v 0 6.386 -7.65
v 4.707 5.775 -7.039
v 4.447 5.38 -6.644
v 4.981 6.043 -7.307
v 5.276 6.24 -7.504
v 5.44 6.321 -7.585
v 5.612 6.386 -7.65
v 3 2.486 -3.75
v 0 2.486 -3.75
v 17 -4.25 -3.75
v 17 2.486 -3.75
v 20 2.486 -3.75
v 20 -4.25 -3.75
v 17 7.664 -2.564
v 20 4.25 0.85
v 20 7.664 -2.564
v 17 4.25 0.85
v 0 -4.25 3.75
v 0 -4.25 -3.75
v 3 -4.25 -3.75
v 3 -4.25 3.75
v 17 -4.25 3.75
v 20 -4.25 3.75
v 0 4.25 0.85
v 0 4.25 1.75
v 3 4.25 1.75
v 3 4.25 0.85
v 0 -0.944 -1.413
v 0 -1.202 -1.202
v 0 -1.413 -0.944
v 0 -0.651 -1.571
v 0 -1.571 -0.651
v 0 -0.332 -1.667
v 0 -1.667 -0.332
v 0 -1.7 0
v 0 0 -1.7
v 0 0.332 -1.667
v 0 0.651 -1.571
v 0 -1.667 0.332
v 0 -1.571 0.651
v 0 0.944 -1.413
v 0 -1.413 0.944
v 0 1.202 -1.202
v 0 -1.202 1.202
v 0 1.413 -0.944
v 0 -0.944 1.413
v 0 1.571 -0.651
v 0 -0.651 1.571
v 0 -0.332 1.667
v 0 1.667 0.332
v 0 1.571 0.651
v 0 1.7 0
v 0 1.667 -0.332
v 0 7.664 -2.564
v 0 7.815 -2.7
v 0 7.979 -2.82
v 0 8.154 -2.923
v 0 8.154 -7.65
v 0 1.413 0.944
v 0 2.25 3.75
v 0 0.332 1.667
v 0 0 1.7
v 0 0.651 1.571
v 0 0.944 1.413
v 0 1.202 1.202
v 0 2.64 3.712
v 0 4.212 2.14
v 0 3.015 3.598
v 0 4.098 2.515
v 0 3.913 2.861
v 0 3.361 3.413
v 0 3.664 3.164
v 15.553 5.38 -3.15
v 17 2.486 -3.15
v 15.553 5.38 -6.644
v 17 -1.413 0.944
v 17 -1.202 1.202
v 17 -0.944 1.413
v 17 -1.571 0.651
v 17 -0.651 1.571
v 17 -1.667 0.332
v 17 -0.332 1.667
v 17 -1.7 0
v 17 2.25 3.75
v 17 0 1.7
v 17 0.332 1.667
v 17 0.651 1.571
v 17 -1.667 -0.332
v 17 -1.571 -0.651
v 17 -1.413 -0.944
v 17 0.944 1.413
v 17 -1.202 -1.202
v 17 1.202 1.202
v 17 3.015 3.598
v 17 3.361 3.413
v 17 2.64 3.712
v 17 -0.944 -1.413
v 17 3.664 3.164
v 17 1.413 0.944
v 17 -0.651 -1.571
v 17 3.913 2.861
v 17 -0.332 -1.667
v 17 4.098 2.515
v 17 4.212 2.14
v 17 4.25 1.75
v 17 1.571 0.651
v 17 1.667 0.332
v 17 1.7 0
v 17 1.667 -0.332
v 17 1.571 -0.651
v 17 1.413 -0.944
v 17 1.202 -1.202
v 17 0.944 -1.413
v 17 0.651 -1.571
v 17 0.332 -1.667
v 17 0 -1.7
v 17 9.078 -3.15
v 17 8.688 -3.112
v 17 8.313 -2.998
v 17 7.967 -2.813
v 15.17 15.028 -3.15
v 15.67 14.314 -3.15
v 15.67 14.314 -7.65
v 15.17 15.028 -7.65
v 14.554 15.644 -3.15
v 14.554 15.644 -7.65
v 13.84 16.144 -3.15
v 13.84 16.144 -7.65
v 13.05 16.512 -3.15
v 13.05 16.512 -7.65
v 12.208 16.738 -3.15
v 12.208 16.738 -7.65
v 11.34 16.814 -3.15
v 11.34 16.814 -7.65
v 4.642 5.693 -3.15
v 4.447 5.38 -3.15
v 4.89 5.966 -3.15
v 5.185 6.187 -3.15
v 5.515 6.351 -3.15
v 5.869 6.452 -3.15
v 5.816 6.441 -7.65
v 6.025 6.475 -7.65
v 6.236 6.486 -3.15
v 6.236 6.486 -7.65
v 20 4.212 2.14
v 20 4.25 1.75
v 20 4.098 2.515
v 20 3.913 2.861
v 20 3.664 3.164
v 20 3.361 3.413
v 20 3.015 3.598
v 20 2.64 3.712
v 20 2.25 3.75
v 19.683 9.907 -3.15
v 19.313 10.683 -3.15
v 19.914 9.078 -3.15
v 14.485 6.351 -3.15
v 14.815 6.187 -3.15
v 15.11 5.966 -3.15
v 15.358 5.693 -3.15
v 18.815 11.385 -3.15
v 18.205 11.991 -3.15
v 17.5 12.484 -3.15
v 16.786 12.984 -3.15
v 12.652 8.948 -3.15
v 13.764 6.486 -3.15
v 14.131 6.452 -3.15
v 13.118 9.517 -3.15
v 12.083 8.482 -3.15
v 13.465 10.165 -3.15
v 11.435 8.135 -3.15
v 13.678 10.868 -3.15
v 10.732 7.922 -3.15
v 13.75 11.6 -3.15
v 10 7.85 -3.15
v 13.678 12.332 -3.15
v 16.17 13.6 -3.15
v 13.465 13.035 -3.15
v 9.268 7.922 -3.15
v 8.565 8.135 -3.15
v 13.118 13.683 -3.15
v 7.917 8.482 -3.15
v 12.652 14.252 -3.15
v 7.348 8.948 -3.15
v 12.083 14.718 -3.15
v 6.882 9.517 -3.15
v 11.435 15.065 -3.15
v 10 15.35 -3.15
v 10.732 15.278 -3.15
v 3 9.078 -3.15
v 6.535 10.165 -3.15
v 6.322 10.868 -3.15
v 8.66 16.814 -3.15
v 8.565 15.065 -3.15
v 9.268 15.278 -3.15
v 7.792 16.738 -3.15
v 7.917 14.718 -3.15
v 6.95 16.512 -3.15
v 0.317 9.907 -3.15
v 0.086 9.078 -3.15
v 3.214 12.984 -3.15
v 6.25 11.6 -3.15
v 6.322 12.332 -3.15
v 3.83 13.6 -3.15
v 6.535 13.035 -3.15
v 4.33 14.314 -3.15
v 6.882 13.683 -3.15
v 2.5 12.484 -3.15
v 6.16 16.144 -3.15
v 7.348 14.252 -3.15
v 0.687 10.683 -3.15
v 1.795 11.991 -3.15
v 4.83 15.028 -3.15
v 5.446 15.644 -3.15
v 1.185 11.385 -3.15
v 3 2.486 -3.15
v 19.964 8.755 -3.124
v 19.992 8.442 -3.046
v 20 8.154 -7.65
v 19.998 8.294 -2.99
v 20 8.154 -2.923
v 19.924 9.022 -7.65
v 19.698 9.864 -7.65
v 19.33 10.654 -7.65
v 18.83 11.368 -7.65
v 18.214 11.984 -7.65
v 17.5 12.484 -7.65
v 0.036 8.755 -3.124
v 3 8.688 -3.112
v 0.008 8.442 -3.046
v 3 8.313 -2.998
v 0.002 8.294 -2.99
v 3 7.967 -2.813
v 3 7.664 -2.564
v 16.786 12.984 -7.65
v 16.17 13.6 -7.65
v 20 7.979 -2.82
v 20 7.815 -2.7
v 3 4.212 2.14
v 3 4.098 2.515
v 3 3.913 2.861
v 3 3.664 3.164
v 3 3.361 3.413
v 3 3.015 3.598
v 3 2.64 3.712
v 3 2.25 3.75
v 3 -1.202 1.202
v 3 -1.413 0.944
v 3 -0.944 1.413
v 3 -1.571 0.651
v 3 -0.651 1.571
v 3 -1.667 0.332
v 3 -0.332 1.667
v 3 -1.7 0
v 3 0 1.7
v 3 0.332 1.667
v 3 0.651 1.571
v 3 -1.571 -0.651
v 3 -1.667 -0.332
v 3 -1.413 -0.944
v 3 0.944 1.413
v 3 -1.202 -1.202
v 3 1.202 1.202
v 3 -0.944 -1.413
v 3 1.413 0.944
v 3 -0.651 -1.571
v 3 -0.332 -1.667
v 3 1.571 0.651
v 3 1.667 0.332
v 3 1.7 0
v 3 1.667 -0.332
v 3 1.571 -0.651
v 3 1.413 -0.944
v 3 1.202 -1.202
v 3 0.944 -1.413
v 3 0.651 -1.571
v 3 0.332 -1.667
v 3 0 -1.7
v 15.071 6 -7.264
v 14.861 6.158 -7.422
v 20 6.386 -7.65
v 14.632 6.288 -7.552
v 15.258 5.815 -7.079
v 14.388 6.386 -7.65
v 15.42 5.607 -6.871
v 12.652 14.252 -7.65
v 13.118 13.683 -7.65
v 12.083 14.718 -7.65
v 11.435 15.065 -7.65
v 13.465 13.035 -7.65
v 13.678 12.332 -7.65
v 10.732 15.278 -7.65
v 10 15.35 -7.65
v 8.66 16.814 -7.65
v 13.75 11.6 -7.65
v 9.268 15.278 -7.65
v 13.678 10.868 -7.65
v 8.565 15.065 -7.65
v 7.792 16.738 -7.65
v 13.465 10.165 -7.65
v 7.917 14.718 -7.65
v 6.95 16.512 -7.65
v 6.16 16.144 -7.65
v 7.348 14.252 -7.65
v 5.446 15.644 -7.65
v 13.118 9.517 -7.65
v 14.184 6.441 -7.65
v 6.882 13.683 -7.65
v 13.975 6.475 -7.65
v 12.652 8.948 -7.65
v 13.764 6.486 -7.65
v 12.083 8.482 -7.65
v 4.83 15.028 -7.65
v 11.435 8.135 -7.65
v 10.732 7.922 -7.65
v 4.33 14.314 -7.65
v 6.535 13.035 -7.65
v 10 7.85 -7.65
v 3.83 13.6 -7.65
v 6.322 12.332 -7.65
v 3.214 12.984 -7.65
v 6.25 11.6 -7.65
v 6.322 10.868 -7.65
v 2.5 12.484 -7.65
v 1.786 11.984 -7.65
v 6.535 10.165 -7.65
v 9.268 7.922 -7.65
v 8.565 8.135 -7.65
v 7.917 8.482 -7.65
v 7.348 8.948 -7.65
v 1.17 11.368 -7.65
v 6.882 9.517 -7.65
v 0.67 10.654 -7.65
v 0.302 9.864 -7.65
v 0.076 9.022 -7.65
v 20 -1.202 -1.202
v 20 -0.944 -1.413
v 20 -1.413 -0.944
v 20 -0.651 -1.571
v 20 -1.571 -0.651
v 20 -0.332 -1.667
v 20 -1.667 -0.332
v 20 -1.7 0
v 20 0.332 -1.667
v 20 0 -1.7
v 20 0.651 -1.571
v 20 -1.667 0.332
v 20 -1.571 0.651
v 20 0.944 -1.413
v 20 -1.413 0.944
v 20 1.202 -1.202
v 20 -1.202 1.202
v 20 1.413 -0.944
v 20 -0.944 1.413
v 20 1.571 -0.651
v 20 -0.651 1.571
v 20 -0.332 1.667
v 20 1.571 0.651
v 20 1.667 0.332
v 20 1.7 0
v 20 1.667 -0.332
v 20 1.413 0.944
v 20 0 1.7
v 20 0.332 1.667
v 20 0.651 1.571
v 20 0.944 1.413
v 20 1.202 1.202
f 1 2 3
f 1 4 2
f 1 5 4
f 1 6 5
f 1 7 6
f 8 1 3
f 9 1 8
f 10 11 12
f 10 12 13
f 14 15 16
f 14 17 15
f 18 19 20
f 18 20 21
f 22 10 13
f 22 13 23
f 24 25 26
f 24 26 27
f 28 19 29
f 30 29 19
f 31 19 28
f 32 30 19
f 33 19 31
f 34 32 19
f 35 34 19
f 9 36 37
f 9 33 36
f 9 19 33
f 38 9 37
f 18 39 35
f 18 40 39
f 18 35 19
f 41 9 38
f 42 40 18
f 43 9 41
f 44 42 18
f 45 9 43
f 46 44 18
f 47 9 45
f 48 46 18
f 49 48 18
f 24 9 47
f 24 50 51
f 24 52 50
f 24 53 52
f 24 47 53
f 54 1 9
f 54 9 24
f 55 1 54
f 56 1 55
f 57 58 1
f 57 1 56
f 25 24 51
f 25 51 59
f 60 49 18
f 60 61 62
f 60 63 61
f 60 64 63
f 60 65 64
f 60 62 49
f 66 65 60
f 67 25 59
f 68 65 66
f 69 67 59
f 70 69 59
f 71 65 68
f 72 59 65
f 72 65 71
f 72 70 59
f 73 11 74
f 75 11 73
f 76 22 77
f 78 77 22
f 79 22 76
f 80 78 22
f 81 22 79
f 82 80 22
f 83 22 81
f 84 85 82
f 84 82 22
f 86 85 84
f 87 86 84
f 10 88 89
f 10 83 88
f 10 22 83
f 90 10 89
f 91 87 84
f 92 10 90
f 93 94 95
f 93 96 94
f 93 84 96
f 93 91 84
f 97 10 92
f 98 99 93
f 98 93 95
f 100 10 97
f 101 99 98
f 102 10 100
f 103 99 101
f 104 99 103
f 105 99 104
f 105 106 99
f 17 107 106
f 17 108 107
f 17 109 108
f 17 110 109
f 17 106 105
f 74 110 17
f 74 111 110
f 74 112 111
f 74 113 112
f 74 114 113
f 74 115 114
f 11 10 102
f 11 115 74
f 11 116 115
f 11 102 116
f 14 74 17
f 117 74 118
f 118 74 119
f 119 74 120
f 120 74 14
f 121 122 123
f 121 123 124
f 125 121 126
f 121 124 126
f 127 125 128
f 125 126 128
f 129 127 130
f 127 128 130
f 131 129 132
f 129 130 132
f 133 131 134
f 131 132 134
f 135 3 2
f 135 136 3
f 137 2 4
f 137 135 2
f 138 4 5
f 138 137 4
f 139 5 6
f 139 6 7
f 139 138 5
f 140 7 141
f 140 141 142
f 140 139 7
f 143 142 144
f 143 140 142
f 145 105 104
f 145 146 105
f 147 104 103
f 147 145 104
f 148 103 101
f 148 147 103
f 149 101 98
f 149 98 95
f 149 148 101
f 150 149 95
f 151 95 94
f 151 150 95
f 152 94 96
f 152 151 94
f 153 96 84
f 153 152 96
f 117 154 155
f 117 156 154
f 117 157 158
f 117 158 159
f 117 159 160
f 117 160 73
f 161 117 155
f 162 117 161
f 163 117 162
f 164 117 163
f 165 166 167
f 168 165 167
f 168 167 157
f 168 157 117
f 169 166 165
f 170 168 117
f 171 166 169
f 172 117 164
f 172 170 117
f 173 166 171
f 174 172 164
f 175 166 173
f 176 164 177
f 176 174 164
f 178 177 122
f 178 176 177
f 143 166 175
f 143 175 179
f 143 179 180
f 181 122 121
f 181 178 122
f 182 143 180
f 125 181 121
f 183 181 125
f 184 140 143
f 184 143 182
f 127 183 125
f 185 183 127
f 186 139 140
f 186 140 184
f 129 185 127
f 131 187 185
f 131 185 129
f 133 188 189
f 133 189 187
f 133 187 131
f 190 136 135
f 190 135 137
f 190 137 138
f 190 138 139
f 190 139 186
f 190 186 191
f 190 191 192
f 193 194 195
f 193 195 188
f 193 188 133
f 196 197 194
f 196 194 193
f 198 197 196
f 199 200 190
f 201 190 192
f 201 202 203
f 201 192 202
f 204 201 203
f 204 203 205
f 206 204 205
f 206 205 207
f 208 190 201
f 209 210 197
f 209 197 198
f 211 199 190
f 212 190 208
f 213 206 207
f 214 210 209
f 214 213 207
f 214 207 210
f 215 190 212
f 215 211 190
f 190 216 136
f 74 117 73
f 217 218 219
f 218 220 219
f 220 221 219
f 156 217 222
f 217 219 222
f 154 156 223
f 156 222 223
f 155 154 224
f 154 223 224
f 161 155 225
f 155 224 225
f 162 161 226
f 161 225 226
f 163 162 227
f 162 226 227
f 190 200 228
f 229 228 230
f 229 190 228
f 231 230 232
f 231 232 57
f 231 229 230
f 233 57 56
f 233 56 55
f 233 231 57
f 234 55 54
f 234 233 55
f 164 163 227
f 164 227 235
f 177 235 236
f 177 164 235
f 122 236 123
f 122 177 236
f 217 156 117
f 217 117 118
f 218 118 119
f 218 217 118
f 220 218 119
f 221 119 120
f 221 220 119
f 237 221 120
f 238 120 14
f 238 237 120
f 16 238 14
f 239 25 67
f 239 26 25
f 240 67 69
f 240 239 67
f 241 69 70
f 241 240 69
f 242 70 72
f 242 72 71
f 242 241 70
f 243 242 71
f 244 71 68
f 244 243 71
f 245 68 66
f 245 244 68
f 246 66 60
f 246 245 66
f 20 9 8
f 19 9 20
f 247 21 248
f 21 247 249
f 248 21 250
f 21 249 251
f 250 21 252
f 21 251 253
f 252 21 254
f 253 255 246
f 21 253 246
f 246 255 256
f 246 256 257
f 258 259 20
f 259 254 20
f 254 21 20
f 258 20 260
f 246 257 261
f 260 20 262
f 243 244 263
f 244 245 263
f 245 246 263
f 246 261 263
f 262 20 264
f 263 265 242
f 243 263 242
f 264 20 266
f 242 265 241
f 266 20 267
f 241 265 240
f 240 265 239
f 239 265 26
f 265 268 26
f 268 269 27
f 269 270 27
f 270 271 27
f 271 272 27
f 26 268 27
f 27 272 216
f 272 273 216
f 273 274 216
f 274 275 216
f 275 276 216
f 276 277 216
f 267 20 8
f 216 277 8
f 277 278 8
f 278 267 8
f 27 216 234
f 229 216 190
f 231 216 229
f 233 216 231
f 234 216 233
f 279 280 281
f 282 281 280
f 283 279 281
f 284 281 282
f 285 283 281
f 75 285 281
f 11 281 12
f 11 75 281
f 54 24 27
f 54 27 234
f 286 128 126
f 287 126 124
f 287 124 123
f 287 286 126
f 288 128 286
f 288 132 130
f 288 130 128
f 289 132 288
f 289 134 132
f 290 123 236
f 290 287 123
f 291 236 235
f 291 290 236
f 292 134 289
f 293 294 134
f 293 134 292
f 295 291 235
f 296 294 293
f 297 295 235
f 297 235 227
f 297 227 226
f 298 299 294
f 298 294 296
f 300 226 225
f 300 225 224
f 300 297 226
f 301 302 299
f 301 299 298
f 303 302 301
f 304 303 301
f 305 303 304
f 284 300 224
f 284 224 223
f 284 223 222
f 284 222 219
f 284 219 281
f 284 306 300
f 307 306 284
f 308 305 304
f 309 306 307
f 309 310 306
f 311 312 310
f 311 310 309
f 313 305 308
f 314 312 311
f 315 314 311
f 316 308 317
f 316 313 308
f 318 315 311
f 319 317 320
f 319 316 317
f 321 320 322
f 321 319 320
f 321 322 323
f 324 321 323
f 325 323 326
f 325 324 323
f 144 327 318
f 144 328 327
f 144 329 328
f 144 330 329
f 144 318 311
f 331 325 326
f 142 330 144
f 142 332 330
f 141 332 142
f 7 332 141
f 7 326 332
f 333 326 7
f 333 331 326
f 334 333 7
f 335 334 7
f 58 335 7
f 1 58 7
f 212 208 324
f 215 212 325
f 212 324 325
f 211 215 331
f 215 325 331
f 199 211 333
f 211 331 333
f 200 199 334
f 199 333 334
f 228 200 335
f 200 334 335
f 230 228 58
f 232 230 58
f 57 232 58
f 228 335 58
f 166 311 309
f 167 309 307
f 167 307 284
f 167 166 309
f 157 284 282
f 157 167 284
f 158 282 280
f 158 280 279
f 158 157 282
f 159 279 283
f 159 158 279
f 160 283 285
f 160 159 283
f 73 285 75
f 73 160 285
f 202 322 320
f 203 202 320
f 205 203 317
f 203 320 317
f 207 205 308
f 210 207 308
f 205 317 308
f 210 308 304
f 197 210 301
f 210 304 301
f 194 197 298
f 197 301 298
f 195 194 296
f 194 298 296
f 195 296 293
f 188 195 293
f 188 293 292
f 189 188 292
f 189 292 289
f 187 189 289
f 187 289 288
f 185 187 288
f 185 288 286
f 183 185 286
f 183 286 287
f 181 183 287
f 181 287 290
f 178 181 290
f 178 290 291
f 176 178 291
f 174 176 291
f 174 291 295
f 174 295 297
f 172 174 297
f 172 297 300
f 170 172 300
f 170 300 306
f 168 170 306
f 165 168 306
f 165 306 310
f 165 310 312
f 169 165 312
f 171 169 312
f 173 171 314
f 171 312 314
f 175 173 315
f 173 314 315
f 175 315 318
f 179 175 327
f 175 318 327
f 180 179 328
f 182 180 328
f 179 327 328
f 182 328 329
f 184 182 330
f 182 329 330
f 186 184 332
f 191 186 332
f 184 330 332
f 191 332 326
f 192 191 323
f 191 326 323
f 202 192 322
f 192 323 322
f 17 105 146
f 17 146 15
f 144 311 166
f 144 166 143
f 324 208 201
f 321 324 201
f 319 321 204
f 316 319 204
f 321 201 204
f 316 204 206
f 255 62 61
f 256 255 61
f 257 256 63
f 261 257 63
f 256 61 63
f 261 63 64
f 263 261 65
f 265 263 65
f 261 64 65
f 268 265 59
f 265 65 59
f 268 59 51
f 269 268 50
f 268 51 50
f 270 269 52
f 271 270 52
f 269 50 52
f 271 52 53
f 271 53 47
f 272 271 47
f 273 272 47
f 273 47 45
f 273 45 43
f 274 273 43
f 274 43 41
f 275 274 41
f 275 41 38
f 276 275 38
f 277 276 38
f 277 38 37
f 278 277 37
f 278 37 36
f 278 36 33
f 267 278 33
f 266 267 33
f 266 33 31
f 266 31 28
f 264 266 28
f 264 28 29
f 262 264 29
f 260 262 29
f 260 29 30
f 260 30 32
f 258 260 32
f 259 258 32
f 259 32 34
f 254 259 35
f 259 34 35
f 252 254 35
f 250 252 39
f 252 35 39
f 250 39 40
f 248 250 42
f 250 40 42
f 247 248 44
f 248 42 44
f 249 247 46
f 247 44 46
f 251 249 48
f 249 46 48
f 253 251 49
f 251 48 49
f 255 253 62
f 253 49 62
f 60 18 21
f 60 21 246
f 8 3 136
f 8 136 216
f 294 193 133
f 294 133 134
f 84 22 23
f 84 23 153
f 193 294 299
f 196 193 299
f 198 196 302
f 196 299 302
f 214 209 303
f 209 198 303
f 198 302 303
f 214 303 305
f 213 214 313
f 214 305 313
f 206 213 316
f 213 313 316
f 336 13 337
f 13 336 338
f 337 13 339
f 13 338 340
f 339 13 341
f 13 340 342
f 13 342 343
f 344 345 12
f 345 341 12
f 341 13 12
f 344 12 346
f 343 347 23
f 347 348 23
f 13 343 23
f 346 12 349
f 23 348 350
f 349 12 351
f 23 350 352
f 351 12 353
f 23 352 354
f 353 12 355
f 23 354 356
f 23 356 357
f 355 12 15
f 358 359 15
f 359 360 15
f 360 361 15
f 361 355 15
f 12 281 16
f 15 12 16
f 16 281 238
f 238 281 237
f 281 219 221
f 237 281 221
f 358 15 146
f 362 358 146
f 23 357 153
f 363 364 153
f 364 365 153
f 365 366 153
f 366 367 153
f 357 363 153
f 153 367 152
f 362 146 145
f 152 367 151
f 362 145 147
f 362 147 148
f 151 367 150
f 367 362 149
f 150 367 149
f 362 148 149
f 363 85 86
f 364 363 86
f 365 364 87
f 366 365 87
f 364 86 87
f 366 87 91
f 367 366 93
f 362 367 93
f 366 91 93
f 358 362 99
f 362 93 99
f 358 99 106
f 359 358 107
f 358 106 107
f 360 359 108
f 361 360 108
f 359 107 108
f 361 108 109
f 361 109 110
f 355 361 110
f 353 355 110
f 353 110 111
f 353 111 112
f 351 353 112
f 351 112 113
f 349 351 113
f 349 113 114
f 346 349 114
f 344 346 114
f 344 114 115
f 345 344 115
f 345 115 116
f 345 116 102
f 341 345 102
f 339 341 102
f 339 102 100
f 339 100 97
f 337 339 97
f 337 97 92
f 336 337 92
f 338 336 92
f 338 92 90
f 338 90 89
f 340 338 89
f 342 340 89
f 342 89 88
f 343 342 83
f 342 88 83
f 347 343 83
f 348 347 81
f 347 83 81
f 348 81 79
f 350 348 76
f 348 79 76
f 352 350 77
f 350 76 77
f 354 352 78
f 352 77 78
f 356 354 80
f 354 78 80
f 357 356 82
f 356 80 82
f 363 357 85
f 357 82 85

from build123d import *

# Parameters (mm, degrees)
SALIENTE_EXTRUIR1_DEPTH = 20
CORTAR_EXTRUIR1_START   = -6.736039
CROQUIS2_W              = 14
CROQUIS2_H              = 7.5
CORTAR_EXTRUIR1_DEPTH   = 6.736039
CORTAR_EXTRUIR2_REACH   = 29.226
CROQUIS3_R              = 1.7
CROQUIS5_W              = 14
CROQUIS5_H              = 5.763961031
CORTAR_EXTRUIR4_DEPTH   = 10
CORTAR_EXTRUIR3_REACH   = 30.507
CROQUIS4_R              = 3.75
CROQUIS4_W              = 5
CROQUIS4_H              = 5
REDONDEO1_R             = 5
REDONDEO2_R             = 5
REDONDEO3_R             = 2


# Some blends are built 0.0001 mm under size
with BuildPart() as part:
    # Croquis1 → Saliente-Extruir1 (new body)
    with BuildSketch(Plane(origin=(0, 0, 0), x_dir=(0, 0, -1), z_dir=(1, 0, 0))):
        Polygon((-3.75, 4.25), (-0.85, 4.25), (3.15, 8.25), (3.15, 16.813961031), (7.65, 16.813961031), (7.65, 6.386038969), (3.75, 2.486038969), (3.75, -4.25), (-3.75, -4.25), align=None)
    extrude(amount=SALIENTE_EXTRUIR1_DEPTH)

    # Croquis2 → Cortar-Extruir1 (cut)
    with BuildSketch(Plane.XZ.offset(4.25).offset(CORTAR_EXTRUIR1_START)):
        with Locations((10, 0)):
            Rectangle(CROQUIS2_W, CROQUIS2_H)
    extrude(amount=CORTAR_EXTRUIR1_DEPTH, mode=Mode.SUBTRACT)

    # Cortar-Extruir2: up to this face of the body (flat: up to its plane)
    cortar_extruir2_end = Plane(part.part.faces().sort_by_distance((20, 4.974035109, -2.43613322))[0])
    # Croquis3 → Cortar-Extruir2 (cut, up to the picked face)
    with BuildSketch(Plane.ZY, mode=Mode.PRIVATE) as cortar_extruir2_sk1:
        Circle(CROQUIS3_R)
    cortar_extruir2_tool1 = split(extrude(cortar_extruir2_sk1.sketch, amount=-CORTAR_EXTRUIR2_REACH, mode=Mode.PRIVATE), bisect_by=cortar_extruir2_end, keep=Keep.BOTH, mode=Mode.PRIVATE)
    add(cortar_extruir2_tool1.solids().sort_by(Axis((0, 0, 0), (1, 0, 0)))[0], mode=Mode.SUBTRACT)

    # Croquis5 → Cortar-Extruir4 (cut)
    with BuildSketch(Plane.XY.offset(-3.15)):
        with Locations((10, 5.368019484)):
            Rectangle(CROQUIS5_W, CROQUIS5_H)
    extrude(amount=CORTAR_EXTRUIR4_DEPTH, mode=Mode.SUBTRACT)

    # Cortar-Extruir3: up to this face of the body (flat: up to its plane)
    cortar_extruir3_end = Plane(part.part.faces().sort_by_distance((10, 10.237705939, -3.15))[0])
    # Croquis4 → Cortar-Extruir3 (cut, up to the picked face)
    with BuildSketch(Plane(origin=(0, 0, -7.65), x_dir=(-1, 0, 0), z_dir=(0, 0, -1)), mode=Mode.PRIVATE) as cortar_extruir3_sk1:
        with Locations((-10, 11.6)):
            Circle(CROQUIS4_R)
    cortar_extruir3_tool1 = split(extrude(cortar_extruir3_sk1.sketch, amount=-CORTAR_EXTRUIR3_REACH, mode=Mode.PRIVATE), bisect_by=cortar_extruir3_end, keep=Keep.BOTH, mode=Mode.PRIVATE)
    # Croquis4 → Cortar-Extruir3 (cut, up to the picked face)
    with BuildSketch(Plane(origin=(0, 0, -7.65), x_dir=(-1, 0, 0), z_dir=(0, 0, -1)), mode=Mode.PRIVATE) as cortar_extruir3_sk2:
        with Locations((-17.5, 14.313961031)):
            Rectangle(CROQUIS4_W, CROQUIS4_H)
    cortar_extruir3_tool2 = split(extrude(cortar_extruir3_sk2.sketch, amount=-CORTAR_EXTRUIR3_REACH, mode=Mode.PRIVATE), bisect_by=cortar_extruir3_end, keep=Keep.BOTH, mode=Mode.PRIVATE)
    # Croquis4 → Cortar-Extruir3 (cut, up to the picked face)
    with BuildSketch(Plane(origin=(0, 0, -7.65), x_dir=(-1, 0, 0), z_dir=(0, 0, -1)), mode=Mode.PRIVATE) as cortar_extruir3_sk3:
        with Locations((-2.5, 14.313961031)):
            Rectangle(CROQUIS4_W, CROQUIS4_H)
    cortar_extruir3_tool3 = split(extrude(cortar_extruir3_sk3.sketch, amount=-CORTAR_EXTRUIR3_REACH, mode=Mode.PRIVATE), bisect_by=cortar_extruir3_end, keep=Keep.BOTH, mode=Mode.PRIVATE)
    # Croquis4 → Cortar-Extruir3 (cut, up to the picked face)
    with BuildSketch(Plane(origin=(0, 0, -7.65), x_dir=(-1, 0, 0), z_dir=(0, 0, -1)), mode=Mode.PRIVATE) as cortar_extruir3_sk4:
        Polygon((-15, 6.486038969), (-5, 6.486038969), (-3, 2.486038969), (-17, 2.486038969), align=None)
    cortar_extruir3_tool4 = split(extrude(cortar_extruir3_sk4.sketch, amount=-CORTAR_EXTRUIR3_REACH, mode=Mode.PRIVATE), bisect_by=cortar_extruir3_end, keep=Keep.BOTH, mode=Mode.PRIVATE)
    add(cortar_extruir3_tool1.solids().sort_by(Axis((10, 11.6, -7.65), (0, 0, 1)))[0], mode=Mode.SUBTRACT)
    add(cortar_extruir3_tool2.solids().sort_by(Axis((17.5, 14.313961, -7.65), (0, 0, 1)))[0], mode=Mode.SUBTRACT)
    add(cortar_extruir3_tool3.solids().sort_by(Axis((2.5, 14.313961, -7.65), (0, 0, 1)))[0], mode=Mode.SUBTRACT)
    add(cortar_extruir3_tool4.solids().sort_by(Axis((10, 4.374928, -7.65), (0, 0, 1)))[0], mode=Mode.SUBTRACT)

    # Redondeo1
    redondeo1_edges = [part.edges().sort_by_distance(p)[0] for p in [
        (5, 11.813961031, -5.4),
        (15, 11.813961031, -5.4),
    ]]
    fillet(redondeo1_edges, radius=REDONDEO1_R - 0.0001)  # a hair under: the kernel refuses the full size

    # Redondeo2
    # the kernel refuses this fillet: 5 mm, written as the material it takes off along each edge
    with BuildSketch(Plane(origin=(15, 16.813961031, -16.800740757), x_dir=(-1, 0, 0), z_dir=(0, 0, 1))) as redondeo2_piece_1:
        with BuildLine():
            CenterArc((3.660296303, 5), REDONDEO2_R, 209.9996692, 60.0003308)
            Line((-0.66984515, 2.500025), (-1.102859295, 2.2500275))
            ThreePointArc((-1.102859295, 2.2500275), (-0.5, 0.0001), (-0.5, 0))
            Line((-0.5, 0), (0, -0.5))
            Line((0, -0.5), (3.660296303, -0.5))
            Line((3.660296303, -0.5), (3.660296303, 0))
        make_face()
    extrude(amount=22.801481513, mode=Mode.SUBTRACT)
    with BuildSketch(Plane(origin=(5, 16.813961031, -16.800740757), x_dir=(-0.258806597579155, -0.9659291615069406, 0), z_dir=(0, 0, 1)), Plane(origin=(20, 11.813961031, -16.800740757), x_dir=(-0.9659291615069399, 0.25880659757915725, 0), z_dir=(0, 0, 1))) as redondeo2_piece_2:
        with BuildLine():
            CenterArc((3.882336975, 4.829619926), REDONDEO2_R, 194.999261652, 60.0003308)
            Line((-0.947308832, 3.535586938), (-1.430273413, 3.40618364))
            Line((-1.430273413, 3.40618364), (-0.482964581, -0.129403299))
            Line((-0.482964581, -0.129403299), (0.129403299, -0.482964581))
            ThreePointArc((0.129403299, -0.482964581), (0.129499892, -0.4829387), (2.458794439, -0.482961993))
            Line((2.458794439, -0.482961993), (2.588207396, 0))
        make_face()
    extrude(amount=22.801481513, mode=Mode.SUBTRACT)
    with BuildSketch(Plane(origin=(0, 11.813961031, -16.800740757), x_dir=(0.9659291615069402, 0.2588065975791559, 0), z_dir=(0, 0, 1))) as redondeo2_piece_3:
        with BuildLine():
            CenterArc((3.882336975, -4.829619926), REDONDEO2_R, 105.000407548, 60.0003308)
            Line((-0.947308832, -3.535586938), (-1.430273413, -3.40618364))
            Line((-1.430273413, -3.40618364), (-0.482964581, 0.129403299))
            Line((-0.482964581, 0.129403299), (0.129403299, 0.482964581))
            ThreePointArc((0.129403299, 0.482964581), (0.129499892, 0.4829387), (2.458794439, 0.482961993))
            Line((2.458794439, 0.482961993), (2.588207396, 0))
        make_face()
    extrude(amount=22.801481513, mode=Mode.SUBTRACT)

    # Redondeo3
    redondeo3_edges = [part.edges().sort_by_distance(p)[0] for p in [
        (15, 6.486038969, -5.4),
        (5, 6.486038969, -5.4),
        (1.500464067, 8.25, -3.15),
        (18.499535933, 8.25, -3.15),
        (18.5, 4.25, 3.75),
        (1.5, 4.25, 3.75),
    ]]
    fillet(redondeo3_edges, radius=REDONDEO3_R)


solid = part.part
